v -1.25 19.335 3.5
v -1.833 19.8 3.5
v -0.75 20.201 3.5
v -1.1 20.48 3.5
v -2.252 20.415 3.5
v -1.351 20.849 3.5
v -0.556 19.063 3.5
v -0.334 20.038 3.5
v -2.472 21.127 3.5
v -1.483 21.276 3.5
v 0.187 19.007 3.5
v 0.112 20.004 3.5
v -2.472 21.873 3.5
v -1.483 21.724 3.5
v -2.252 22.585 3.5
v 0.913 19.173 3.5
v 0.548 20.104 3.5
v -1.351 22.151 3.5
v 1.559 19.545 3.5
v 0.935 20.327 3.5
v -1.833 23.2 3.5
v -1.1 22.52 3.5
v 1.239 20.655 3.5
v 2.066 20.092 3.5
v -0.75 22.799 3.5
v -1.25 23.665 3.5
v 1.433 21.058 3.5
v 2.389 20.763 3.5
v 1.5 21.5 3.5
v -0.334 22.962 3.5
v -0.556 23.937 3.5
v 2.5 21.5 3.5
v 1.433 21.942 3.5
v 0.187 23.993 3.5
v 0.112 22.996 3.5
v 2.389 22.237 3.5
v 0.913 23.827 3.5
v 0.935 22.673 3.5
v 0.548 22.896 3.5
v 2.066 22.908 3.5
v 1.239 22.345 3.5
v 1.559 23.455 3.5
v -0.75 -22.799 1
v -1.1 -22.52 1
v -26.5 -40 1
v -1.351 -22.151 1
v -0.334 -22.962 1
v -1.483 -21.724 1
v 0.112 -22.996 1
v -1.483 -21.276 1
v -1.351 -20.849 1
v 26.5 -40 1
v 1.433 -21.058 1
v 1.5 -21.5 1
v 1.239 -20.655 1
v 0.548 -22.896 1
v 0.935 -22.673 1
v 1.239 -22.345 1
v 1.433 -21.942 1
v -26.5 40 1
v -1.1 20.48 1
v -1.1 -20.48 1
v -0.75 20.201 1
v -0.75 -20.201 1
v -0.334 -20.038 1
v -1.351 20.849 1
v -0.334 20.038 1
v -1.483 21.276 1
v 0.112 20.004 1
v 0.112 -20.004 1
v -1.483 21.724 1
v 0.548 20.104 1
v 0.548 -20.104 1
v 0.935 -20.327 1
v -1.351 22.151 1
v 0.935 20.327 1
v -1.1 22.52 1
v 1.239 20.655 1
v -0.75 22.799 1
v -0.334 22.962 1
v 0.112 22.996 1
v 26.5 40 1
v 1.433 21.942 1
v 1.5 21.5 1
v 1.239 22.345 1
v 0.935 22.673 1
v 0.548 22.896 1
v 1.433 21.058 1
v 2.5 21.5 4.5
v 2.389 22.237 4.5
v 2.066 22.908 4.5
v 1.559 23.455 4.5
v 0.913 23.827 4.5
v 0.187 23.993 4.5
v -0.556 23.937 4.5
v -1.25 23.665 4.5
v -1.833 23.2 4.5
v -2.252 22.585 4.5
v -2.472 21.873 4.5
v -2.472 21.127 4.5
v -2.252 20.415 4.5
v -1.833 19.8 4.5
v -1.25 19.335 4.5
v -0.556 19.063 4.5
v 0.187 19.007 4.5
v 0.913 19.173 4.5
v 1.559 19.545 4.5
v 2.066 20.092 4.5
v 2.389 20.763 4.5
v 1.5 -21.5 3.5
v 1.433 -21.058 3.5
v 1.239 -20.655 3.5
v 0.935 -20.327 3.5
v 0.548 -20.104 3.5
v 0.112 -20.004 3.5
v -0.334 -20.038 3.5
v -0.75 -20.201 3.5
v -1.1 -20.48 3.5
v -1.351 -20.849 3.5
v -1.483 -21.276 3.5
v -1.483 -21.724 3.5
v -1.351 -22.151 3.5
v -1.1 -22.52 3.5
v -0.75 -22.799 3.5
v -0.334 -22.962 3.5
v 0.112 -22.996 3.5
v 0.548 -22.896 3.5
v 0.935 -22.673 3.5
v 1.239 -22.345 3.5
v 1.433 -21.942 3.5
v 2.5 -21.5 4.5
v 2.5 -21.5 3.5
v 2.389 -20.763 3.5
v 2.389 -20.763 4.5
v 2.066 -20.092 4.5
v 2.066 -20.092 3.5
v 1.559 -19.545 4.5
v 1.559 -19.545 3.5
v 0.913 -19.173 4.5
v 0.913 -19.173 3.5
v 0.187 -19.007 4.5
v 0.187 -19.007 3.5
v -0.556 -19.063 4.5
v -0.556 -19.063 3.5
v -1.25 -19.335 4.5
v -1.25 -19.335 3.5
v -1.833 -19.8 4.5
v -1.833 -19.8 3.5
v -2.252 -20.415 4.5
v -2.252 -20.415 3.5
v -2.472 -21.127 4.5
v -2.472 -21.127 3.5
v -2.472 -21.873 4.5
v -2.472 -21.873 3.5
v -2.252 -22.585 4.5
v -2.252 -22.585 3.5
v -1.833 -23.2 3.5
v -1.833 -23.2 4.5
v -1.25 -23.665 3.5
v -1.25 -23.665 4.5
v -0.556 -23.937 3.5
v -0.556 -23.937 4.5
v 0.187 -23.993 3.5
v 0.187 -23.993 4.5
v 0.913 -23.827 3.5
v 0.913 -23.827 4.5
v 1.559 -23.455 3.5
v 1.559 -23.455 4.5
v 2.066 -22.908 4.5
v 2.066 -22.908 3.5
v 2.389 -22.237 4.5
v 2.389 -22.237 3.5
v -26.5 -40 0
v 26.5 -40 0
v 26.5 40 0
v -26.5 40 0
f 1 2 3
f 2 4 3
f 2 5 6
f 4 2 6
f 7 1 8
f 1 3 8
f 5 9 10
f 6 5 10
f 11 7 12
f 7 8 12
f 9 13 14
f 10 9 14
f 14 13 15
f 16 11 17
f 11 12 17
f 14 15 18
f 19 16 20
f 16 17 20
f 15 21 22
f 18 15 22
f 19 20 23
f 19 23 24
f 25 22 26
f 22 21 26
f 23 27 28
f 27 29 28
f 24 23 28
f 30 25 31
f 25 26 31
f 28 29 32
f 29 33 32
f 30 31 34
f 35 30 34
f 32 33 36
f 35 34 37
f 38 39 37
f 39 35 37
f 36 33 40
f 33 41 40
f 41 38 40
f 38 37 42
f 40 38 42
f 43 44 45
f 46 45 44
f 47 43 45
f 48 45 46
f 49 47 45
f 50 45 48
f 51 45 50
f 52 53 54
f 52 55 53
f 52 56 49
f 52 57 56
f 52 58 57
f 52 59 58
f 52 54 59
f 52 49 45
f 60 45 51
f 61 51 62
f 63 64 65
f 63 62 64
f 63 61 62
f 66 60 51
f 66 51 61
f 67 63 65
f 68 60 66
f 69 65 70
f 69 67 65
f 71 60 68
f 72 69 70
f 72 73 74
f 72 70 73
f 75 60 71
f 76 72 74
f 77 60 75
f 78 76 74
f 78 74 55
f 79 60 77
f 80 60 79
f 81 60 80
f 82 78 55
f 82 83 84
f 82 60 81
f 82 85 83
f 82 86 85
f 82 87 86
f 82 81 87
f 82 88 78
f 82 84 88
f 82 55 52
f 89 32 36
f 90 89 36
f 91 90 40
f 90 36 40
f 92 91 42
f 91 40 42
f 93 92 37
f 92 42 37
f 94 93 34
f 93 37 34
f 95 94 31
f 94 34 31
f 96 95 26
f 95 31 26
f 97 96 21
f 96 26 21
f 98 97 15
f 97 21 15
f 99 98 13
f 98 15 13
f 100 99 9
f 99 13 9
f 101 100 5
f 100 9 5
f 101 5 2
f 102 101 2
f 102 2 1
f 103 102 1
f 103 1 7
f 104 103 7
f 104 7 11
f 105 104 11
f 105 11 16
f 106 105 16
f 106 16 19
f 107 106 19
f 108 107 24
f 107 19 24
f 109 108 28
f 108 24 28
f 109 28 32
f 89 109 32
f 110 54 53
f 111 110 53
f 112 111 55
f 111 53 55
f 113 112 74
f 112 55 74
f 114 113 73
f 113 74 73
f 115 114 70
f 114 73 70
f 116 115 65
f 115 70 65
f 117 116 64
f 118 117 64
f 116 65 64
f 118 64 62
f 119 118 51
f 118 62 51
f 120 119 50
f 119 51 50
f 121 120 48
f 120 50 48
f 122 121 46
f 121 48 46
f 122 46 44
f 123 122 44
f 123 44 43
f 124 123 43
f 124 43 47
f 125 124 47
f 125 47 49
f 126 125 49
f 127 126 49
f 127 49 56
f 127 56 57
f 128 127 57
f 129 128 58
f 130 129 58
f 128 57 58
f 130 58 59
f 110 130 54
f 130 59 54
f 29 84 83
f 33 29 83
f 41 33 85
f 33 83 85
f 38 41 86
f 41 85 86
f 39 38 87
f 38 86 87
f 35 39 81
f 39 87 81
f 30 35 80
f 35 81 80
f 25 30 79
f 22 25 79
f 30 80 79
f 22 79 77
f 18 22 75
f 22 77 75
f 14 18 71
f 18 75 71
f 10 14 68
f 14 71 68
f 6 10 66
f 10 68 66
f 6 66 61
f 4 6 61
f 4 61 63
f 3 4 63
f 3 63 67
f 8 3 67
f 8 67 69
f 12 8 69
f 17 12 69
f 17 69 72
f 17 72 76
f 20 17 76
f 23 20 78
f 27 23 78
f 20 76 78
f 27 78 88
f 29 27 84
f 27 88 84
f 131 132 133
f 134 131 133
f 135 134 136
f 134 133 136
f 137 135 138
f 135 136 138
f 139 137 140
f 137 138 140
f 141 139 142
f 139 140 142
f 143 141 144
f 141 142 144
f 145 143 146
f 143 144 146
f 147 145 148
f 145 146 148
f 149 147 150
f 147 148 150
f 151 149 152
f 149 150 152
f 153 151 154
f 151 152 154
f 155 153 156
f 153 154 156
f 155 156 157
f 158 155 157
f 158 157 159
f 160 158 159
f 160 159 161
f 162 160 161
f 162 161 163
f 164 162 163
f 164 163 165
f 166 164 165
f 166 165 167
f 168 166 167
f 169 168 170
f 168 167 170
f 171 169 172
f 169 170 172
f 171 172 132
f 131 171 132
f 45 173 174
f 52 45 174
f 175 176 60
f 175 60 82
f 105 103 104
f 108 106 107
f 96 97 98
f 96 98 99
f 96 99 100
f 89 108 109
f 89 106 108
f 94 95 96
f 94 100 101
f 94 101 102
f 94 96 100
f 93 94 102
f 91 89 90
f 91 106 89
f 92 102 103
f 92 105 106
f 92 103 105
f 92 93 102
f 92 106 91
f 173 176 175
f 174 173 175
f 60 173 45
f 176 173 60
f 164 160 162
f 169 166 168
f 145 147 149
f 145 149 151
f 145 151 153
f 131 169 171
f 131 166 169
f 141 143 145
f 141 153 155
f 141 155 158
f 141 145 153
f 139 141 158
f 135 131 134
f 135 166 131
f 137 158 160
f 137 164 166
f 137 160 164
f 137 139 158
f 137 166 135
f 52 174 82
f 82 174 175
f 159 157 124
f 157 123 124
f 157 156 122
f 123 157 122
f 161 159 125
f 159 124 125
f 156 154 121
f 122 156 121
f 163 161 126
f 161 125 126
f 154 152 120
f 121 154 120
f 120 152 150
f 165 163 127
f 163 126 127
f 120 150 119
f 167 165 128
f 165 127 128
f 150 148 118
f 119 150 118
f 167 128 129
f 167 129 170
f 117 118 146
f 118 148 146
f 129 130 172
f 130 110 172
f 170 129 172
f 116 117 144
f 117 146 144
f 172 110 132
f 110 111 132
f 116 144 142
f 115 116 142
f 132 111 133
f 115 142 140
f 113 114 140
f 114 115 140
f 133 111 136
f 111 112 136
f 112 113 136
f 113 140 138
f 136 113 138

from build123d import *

# Parameters (mm, degrees)
SKETCH_W     = 53
SKETCH_H     = 80
PAD_DEPTH    = 1
SKETCH001_R  = 1.5
PAD001_DEPTH = 2.5
SKETCH002_R  = 2.5
PAD002_DEPTH = 1


with BuildPart() as part:
    # Sketch → Pad (new body)
    with BuildSketch(Plane.XY):
        Rectangle(SKETCH_W, SKETCH_H)
    extrude(amount=PAD_DEPTH)

    # Sketch001 (on Face6 of Pad) → Pad001 (join)
    with BuildSketch(Plane.XY.offset(1)):
        with Locations((0, 21.5)):
            Circle(SKETCH001_R)
        with Locations((0, -21.5)):
            Circle(SKETCH001_R)
    extrude(amount=PAD001_DEPTH)

    # Sketch002 (on Face9 of Pad001) → Pad002 (join)
    with BuildSketch(Plane.XY.offset(3.5)):
        with Locations((0, 21.5)):
            Circle(SKETCH002_R)
        with Locations((0, -21.5)):
            Circle(SKETCH002_R)
    extrude(amount=PAD002_DEPTH)


solid = part.part
